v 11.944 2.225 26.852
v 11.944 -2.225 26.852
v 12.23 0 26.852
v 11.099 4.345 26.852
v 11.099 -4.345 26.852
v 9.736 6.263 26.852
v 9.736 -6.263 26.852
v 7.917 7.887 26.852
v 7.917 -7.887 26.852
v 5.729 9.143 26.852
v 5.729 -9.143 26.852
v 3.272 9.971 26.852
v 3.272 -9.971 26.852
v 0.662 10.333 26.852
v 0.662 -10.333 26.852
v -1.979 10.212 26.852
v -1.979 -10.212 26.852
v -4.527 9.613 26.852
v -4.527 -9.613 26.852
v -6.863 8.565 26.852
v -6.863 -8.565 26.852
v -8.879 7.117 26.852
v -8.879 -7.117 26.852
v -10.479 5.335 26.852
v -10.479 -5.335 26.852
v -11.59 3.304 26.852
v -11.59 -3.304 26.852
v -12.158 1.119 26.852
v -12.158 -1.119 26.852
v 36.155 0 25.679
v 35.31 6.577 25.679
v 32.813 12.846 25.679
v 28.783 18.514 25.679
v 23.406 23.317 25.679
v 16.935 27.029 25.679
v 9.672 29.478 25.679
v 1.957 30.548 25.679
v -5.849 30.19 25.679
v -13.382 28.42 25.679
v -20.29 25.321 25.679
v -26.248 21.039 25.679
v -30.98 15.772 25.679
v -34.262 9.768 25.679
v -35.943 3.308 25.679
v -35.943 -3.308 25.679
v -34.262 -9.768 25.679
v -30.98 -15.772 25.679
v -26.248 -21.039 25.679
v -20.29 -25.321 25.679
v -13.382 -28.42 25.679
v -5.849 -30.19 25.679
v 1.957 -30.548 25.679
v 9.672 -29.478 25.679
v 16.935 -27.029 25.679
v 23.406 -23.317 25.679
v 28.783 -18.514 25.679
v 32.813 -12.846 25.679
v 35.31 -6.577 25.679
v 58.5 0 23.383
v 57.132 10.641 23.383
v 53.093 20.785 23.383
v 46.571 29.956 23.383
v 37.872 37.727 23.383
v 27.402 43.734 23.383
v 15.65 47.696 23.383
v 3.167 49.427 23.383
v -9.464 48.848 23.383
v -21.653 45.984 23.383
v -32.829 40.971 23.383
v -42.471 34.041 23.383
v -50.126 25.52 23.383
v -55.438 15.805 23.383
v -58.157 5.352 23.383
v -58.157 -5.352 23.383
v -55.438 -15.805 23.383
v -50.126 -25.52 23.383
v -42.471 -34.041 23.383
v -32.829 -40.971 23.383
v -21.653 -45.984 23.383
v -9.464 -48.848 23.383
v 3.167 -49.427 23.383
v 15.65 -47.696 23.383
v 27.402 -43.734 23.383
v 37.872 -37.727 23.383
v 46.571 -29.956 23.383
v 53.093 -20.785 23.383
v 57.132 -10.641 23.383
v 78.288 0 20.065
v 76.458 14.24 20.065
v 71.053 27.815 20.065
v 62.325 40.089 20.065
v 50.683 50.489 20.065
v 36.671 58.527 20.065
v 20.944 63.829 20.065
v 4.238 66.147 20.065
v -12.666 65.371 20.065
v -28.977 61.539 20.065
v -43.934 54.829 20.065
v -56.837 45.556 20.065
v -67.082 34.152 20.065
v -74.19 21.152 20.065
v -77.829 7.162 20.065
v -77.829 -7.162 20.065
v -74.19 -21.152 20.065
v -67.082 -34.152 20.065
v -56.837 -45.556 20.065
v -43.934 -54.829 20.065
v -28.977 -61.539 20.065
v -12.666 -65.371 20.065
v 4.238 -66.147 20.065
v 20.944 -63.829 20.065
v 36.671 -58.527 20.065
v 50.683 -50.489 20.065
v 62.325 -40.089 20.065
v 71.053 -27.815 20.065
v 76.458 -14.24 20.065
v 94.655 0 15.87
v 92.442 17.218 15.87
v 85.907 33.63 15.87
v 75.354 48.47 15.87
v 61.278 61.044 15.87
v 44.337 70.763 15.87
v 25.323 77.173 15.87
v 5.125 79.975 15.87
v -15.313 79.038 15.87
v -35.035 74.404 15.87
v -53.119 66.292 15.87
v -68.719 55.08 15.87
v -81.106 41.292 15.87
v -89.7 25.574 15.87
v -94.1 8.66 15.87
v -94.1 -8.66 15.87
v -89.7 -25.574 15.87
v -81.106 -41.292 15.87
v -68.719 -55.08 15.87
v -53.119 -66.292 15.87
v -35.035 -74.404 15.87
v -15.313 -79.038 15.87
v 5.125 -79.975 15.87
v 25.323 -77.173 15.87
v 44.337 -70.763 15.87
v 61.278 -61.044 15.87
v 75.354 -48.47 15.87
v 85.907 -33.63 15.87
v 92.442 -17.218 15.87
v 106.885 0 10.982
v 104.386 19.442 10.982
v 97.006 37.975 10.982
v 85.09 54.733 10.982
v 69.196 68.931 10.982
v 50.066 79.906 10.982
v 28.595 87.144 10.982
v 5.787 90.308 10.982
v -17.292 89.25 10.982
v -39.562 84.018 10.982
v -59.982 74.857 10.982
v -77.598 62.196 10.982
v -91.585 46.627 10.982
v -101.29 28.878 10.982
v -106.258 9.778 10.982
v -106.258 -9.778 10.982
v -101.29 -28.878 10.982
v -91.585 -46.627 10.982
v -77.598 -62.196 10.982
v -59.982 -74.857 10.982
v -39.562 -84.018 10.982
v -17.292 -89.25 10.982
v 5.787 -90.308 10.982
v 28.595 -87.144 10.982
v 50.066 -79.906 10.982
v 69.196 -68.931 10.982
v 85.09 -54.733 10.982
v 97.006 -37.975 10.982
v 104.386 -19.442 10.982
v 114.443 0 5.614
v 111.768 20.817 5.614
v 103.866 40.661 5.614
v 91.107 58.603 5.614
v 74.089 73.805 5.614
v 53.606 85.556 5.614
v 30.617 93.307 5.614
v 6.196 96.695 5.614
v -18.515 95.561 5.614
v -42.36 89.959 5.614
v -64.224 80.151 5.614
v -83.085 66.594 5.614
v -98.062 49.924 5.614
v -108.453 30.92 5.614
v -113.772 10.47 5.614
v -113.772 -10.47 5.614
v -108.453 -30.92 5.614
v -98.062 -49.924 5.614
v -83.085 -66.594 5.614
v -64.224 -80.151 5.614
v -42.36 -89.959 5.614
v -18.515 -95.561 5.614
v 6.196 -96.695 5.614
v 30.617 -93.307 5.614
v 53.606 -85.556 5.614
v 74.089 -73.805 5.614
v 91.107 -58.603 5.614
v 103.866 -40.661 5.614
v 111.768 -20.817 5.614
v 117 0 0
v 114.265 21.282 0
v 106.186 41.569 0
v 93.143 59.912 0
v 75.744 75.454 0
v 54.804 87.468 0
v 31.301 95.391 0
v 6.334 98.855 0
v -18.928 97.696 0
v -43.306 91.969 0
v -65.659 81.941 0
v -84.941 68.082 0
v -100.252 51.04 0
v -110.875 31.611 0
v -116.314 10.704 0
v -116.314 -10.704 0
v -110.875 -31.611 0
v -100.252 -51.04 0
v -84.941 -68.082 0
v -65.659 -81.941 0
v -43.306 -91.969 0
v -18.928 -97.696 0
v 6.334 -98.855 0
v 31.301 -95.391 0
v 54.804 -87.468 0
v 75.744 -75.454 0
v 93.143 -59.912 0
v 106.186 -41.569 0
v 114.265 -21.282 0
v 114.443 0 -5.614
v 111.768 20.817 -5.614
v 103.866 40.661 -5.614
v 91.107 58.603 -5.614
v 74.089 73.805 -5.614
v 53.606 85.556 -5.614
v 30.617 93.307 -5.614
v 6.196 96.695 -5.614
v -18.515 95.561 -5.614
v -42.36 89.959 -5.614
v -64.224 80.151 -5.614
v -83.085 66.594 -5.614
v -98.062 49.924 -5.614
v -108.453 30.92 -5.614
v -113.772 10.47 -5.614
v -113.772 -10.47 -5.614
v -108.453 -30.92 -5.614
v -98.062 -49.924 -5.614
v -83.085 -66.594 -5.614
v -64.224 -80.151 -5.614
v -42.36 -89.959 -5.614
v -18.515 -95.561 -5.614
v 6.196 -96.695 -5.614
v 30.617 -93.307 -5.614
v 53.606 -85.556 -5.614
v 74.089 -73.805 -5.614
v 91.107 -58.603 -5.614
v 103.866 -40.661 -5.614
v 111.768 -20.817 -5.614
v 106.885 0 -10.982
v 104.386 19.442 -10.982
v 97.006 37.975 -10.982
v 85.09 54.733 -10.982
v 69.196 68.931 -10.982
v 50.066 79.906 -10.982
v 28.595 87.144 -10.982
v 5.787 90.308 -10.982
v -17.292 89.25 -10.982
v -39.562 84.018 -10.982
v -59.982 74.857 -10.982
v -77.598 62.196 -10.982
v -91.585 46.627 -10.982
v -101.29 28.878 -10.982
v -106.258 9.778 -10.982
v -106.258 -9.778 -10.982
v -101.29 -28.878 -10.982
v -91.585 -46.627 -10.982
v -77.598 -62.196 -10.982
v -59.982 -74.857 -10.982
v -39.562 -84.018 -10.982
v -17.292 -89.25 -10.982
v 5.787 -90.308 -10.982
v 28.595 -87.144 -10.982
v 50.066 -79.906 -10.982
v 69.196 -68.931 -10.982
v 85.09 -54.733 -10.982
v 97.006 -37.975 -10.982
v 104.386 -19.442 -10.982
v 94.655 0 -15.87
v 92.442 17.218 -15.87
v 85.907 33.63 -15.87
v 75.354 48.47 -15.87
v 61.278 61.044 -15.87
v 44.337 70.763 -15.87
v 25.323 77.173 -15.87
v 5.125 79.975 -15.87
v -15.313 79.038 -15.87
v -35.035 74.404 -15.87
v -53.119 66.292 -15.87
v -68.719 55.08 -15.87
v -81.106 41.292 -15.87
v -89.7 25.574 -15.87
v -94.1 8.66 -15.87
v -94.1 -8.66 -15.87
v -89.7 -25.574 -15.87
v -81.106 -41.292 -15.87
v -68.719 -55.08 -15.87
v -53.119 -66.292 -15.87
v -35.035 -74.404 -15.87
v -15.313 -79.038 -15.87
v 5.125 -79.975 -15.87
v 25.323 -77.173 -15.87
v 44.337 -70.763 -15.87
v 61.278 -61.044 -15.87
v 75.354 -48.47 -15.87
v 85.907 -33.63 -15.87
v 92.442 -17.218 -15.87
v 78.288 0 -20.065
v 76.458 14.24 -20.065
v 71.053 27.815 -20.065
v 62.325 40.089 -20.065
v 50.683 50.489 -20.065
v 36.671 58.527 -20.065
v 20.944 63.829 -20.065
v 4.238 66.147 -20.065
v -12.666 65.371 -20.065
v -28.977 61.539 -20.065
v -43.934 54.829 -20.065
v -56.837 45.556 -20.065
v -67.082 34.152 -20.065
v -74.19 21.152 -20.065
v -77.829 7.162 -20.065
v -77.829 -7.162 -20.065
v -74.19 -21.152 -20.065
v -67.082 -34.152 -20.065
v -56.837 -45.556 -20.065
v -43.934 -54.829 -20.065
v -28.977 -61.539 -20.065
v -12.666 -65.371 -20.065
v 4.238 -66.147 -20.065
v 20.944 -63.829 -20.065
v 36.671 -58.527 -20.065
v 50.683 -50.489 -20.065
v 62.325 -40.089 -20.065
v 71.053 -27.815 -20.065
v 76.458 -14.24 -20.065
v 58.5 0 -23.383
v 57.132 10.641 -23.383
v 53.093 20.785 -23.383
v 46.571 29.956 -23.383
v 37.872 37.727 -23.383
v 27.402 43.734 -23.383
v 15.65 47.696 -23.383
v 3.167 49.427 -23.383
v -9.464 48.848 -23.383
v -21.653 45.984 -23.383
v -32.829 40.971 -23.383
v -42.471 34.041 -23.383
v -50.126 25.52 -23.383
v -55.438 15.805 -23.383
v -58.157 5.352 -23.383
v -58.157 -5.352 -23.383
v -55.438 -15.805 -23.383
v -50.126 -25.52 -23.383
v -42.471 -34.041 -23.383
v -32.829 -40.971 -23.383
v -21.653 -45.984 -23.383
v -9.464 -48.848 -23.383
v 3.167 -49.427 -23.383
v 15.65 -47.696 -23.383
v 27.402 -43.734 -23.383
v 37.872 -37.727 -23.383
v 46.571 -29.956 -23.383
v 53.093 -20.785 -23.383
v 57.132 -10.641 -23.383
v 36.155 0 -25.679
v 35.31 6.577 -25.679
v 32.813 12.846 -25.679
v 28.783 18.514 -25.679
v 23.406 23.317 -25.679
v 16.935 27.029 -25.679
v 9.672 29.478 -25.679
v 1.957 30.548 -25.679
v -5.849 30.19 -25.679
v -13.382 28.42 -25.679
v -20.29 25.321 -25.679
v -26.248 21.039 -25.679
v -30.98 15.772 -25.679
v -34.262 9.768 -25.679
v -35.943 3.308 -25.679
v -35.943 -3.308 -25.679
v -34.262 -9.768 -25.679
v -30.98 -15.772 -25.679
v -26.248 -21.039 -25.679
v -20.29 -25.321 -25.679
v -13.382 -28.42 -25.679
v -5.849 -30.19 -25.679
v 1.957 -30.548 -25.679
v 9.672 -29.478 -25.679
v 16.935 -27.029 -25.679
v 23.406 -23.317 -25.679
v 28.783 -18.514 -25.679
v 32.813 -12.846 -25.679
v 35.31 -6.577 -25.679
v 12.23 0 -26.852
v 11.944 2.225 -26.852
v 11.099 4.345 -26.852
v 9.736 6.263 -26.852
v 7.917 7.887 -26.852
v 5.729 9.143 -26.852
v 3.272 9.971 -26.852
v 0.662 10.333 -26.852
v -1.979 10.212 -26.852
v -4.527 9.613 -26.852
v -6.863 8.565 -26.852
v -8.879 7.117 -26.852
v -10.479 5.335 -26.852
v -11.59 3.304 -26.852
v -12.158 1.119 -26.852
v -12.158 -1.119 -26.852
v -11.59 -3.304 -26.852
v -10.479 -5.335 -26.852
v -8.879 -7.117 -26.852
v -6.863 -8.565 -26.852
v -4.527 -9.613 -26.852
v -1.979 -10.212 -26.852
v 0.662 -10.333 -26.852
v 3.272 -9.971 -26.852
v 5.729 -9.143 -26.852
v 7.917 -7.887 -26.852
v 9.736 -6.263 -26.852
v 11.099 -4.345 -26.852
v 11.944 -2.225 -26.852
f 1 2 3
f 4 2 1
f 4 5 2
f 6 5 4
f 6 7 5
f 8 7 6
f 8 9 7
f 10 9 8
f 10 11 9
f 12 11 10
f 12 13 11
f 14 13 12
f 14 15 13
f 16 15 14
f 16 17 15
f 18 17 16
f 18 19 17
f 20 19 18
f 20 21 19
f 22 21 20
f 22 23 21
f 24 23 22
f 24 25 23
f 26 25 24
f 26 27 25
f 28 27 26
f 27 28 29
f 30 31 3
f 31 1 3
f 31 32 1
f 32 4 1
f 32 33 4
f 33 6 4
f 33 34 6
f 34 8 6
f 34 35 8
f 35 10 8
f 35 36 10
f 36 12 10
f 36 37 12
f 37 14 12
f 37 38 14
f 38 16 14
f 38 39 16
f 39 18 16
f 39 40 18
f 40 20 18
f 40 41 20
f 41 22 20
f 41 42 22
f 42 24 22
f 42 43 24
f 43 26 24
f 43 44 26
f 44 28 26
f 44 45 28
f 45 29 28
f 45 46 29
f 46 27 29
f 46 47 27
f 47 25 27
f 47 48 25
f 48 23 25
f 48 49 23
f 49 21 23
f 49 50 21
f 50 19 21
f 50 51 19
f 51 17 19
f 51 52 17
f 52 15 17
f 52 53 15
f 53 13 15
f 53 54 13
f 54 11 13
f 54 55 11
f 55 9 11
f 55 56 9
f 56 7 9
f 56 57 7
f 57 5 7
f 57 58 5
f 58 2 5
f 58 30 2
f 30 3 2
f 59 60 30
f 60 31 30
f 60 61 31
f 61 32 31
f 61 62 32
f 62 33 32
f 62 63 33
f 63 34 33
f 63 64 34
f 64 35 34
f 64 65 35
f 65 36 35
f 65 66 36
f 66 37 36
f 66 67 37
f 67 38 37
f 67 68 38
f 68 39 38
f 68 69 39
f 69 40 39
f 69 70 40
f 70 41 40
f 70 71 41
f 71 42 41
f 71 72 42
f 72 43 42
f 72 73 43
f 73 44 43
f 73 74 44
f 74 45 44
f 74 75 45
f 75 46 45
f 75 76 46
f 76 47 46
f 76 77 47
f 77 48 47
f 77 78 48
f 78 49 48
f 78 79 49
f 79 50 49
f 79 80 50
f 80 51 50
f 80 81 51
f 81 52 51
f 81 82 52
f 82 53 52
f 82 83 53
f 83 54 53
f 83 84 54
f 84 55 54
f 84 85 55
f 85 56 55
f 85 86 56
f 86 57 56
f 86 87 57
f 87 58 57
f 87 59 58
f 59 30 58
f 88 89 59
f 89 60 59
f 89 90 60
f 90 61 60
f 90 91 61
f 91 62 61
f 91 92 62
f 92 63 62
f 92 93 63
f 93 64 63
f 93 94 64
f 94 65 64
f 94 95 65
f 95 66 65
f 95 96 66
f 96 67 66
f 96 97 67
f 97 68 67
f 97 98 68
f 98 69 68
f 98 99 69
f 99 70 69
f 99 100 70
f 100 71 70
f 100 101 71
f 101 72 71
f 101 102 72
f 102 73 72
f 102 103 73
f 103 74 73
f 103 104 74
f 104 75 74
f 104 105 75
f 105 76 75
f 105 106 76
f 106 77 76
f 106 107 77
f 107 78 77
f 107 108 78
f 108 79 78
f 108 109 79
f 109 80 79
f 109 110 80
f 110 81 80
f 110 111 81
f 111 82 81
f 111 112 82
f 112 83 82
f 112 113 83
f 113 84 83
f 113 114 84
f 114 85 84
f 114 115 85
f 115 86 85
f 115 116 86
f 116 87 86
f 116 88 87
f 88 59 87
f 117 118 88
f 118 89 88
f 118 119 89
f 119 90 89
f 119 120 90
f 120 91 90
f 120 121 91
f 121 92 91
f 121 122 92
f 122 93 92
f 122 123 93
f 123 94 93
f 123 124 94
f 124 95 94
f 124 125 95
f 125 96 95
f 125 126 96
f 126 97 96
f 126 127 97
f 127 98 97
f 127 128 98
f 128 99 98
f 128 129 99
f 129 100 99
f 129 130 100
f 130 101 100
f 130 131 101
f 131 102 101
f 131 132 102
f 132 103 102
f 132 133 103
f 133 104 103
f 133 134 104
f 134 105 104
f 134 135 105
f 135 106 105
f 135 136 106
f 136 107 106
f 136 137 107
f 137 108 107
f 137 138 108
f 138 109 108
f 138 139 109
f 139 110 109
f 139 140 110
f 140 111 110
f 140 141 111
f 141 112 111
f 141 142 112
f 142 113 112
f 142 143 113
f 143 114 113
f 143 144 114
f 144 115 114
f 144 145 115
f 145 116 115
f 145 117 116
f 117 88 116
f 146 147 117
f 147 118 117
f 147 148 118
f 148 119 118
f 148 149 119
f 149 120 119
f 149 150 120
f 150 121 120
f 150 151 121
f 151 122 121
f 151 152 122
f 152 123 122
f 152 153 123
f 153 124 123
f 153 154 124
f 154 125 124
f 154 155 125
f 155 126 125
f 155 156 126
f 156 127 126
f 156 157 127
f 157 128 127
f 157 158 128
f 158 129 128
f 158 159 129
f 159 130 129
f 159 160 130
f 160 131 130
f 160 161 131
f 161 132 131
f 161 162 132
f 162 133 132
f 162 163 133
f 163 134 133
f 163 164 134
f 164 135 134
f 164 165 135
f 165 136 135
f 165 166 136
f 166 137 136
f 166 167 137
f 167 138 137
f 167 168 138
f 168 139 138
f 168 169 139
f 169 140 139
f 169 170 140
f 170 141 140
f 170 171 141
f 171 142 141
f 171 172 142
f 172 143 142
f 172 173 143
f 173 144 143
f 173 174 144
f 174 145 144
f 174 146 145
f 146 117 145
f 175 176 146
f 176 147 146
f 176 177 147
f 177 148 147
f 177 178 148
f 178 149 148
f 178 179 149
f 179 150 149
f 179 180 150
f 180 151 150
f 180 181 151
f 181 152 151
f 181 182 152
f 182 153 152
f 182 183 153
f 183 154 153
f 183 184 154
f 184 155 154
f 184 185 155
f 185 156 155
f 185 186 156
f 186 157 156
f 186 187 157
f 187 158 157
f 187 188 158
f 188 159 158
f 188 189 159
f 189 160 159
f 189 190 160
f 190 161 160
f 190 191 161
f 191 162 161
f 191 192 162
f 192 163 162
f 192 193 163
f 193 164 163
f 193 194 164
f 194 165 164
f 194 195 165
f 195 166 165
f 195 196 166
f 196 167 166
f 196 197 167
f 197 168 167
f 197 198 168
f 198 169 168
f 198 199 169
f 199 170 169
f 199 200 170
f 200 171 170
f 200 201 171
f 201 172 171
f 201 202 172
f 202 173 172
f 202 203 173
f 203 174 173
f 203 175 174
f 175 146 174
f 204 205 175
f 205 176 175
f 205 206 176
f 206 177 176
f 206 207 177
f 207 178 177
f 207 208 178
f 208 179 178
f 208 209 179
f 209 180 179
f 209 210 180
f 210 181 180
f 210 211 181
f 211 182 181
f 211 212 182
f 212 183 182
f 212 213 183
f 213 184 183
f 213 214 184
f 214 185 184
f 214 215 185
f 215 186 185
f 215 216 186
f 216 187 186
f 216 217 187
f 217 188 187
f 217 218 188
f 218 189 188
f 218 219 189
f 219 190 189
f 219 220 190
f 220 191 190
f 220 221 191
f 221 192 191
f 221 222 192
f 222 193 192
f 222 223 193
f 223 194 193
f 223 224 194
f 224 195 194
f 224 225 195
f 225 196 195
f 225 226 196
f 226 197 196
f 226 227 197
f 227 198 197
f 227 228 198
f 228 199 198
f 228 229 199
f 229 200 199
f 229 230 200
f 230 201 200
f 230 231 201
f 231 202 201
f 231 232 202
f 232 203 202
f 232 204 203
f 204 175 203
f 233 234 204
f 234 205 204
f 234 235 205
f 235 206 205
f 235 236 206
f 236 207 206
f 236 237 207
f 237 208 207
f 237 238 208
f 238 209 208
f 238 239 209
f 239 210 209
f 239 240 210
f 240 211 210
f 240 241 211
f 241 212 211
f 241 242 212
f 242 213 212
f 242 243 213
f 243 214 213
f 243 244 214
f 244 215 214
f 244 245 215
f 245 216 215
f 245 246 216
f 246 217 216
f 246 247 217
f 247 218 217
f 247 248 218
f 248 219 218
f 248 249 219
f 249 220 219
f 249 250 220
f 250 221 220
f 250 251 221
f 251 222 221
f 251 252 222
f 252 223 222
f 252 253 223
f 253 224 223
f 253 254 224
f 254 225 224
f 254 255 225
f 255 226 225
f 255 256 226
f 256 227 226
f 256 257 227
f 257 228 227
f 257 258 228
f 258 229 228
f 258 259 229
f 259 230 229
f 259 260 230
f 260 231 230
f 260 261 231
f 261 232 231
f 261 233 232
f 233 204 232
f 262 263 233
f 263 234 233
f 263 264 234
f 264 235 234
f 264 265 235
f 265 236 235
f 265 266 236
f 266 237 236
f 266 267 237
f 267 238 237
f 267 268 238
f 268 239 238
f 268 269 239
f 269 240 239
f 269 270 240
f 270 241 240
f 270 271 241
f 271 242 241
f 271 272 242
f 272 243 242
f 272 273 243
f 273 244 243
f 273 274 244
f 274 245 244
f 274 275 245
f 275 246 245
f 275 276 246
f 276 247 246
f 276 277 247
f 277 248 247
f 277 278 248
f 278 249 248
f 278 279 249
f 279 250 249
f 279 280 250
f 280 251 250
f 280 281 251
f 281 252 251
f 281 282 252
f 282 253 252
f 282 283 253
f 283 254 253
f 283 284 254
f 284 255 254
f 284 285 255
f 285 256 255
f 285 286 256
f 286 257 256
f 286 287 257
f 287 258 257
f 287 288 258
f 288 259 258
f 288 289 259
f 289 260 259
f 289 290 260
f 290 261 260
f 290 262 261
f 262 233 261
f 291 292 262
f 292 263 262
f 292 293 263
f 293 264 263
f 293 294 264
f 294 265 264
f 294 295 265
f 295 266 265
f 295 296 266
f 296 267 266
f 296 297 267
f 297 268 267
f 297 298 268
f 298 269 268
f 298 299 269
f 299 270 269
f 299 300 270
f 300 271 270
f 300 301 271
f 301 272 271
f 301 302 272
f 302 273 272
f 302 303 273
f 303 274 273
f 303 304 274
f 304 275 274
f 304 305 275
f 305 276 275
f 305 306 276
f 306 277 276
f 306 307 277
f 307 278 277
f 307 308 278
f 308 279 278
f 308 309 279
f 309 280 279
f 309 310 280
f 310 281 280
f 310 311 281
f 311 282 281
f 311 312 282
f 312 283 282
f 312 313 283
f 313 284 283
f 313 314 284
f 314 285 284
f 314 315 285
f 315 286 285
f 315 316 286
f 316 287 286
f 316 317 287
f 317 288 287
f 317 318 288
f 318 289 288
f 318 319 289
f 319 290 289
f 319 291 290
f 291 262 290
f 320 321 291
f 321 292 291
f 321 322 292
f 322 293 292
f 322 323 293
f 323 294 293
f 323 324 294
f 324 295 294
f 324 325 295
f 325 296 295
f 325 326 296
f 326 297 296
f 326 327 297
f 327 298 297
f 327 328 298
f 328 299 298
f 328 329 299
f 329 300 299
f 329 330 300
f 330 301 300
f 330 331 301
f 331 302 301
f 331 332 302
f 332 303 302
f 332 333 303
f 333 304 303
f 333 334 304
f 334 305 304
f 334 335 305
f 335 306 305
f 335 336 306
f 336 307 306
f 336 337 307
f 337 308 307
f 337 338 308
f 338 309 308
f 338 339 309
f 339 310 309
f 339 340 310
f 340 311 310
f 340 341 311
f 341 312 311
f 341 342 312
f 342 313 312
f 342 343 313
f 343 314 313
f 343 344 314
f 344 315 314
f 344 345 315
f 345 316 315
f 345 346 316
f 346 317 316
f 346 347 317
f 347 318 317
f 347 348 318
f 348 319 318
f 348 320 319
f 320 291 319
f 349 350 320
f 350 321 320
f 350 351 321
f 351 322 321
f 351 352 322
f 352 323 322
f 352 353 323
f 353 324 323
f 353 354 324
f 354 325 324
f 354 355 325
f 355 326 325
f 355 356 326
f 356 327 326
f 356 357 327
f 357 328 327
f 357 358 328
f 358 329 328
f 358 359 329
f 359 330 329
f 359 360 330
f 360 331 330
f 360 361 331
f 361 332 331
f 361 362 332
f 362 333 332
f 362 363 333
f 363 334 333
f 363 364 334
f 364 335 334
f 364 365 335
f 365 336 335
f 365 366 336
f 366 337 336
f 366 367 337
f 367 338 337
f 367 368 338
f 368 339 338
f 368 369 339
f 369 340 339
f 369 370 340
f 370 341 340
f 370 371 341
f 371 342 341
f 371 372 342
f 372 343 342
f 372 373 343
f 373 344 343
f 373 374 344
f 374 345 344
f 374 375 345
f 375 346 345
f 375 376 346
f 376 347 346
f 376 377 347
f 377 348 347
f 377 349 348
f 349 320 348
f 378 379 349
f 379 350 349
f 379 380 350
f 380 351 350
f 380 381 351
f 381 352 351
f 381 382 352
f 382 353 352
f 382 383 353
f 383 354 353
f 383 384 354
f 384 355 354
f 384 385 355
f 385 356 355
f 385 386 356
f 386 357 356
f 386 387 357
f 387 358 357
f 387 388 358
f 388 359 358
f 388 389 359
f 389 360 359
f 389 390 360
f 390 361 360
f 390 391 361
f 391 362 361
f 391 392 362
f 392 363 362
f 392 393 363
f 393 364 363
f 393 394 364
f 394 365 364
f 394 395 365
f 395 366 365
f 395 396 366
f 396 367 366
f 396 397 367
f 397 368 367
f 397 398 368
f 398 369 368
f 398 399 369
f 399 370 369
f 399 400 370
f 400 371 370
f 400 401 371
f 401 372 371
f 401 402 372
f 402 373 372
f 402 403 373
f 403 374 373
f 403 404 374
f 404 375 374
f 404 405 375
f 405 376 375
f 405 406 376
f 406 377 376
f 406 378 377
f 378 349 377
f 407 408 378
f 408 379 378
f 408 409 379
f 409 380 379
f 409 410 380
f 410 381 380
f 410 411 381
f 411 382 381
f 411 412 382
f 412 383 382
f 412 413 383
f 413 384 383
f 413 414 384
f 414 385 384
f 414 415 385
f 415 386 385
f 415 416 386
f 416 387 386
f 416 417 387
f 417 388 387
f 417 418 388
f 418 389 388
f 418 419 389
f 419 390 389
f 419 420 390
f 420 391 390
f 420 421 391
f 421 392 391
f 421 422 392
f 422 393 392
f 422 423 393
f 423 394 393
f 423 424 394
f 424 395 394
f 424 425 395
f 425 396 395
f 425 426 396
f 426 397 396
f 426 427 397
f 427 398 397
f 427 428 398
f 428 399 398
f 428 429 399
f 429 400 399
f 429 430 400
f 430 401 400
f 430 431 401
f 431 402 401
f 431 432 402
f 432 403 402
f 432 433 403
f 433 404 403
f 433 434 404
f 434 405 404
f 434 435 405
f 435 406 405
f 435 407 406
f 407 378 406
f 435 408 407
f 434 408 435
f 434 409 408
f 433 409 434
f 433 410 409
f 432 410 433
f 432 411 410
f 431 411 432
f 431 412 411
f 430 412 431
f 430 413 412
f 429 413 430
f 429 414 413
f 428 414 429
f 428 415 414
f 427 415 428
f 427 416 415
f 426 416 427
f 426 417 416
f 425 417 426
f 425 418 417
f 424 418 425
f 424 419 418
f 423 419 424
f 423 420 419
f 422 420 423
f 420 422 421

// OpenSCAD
// Generated by SolidPython 1.0.1 on 2020-07-29 00:46:50


scale(v = [13, 11, 3]) {
	sphere(r = 9);
}
/***********************************************
*********      SolidPython code:      **********
************************************************
 
# import packages: SolidPython
from solid import *
from solid.utils import *
from itertools import chain, combinations, permutations


class Resize:

    def __init__(self, scad_file):
        self.scad_file = scad_file
        #self.scad_file = import_scad(scad_file)
        # cone/cylinder param:
        self.r1 = 0
        self.r2 = 0
        self.h = 0
        # rectangular prism param:
        self.w = 0
        self.l = 0
        # ellipse param:
        self.r = 0

    # import OpenScad code (file name corresponds to shape)


    # classify shape + parameters
    def assign(self, param1, param2, param3):
        if self.scad_file == 'cone.scad':
            self.r1 = param1
            self.r2 = param2
            self.h = param3
        elif self.scad_file == 'cylinder.scad':
            self.r1 = param1
            self.r2 = param2
            self.h = param3
        elif self.scad_file == 'rectangularPrism.scad':
            self.h = param1
            self.l = param2
            self.w = param3
        else:
            self.r = param1
            self.h = param2

    # resize parameters
    def iterate(self):
        x = range(3, 20, 2)
        i = 1
        if self.scad_file == 'cone.scad':
            tempList = list(permutations(x, 2))
            for temp in tempList:
                param1 = temp[0]
                param2 = temp[1]
                filepath = 'produced_scad_files/' + 'cone' + str(param1) + '_' + str(param2) + '_' + '.scad'
                scad_render_to_file(cylinder(h=param1, r1=param2, r2=0), filepath)

        elif self.scad_file == 'cylinder.scad':
            tempList = list(permutations(x, 3))
            for temp in tempList:
                param1 = temp[0]
                param2 = temp[1]
                filepath = 'produced_scad_files/' + 'cylinder' + str(param1) + '_' + str(param2) + '_' + '.scad'
                scad_render_to_file(cylinder(h=param1, r1=param2, r2=param2), filepath)

        elif self.scad_file == 'rectangularPrism.scad':
            tempList = list(permutations(x, 3))
            for temp in tempList:
                param1 = temp[0]
                param2 = temp[1]
                param3 = temp[2]
                filepath = 'produced_scad_files/' + 'rectangularPrism' + str(param1) + '_' + str(param2) + '_' + str(
                    param3) + '.scad'
                scad_render_to_file(cube(size=(param1, param2, param3)), filepath)

        elif self.scad_file == 'ellipse.scad':
            tempList = list(permutations(x, 4))
            for temp in tempList:
                param1 = temp[0]
                param2 = temp[1]
                param3 = temp[2]
                param4 = temp[3]
                filepath = 'produced_scad_files/' + 'ellipse' + str(param1) + '_' + str(param2) + '_' + str(param3) + '_' + str(param4) + '.scad'
                scad_render_to_file(scale([param1, param2, param3])(sphere(r=param4)), filepath)

    def render_to_scadfile(self):
        scad_render_to_file(scad, 'example.scad') 
 
************************************************/
